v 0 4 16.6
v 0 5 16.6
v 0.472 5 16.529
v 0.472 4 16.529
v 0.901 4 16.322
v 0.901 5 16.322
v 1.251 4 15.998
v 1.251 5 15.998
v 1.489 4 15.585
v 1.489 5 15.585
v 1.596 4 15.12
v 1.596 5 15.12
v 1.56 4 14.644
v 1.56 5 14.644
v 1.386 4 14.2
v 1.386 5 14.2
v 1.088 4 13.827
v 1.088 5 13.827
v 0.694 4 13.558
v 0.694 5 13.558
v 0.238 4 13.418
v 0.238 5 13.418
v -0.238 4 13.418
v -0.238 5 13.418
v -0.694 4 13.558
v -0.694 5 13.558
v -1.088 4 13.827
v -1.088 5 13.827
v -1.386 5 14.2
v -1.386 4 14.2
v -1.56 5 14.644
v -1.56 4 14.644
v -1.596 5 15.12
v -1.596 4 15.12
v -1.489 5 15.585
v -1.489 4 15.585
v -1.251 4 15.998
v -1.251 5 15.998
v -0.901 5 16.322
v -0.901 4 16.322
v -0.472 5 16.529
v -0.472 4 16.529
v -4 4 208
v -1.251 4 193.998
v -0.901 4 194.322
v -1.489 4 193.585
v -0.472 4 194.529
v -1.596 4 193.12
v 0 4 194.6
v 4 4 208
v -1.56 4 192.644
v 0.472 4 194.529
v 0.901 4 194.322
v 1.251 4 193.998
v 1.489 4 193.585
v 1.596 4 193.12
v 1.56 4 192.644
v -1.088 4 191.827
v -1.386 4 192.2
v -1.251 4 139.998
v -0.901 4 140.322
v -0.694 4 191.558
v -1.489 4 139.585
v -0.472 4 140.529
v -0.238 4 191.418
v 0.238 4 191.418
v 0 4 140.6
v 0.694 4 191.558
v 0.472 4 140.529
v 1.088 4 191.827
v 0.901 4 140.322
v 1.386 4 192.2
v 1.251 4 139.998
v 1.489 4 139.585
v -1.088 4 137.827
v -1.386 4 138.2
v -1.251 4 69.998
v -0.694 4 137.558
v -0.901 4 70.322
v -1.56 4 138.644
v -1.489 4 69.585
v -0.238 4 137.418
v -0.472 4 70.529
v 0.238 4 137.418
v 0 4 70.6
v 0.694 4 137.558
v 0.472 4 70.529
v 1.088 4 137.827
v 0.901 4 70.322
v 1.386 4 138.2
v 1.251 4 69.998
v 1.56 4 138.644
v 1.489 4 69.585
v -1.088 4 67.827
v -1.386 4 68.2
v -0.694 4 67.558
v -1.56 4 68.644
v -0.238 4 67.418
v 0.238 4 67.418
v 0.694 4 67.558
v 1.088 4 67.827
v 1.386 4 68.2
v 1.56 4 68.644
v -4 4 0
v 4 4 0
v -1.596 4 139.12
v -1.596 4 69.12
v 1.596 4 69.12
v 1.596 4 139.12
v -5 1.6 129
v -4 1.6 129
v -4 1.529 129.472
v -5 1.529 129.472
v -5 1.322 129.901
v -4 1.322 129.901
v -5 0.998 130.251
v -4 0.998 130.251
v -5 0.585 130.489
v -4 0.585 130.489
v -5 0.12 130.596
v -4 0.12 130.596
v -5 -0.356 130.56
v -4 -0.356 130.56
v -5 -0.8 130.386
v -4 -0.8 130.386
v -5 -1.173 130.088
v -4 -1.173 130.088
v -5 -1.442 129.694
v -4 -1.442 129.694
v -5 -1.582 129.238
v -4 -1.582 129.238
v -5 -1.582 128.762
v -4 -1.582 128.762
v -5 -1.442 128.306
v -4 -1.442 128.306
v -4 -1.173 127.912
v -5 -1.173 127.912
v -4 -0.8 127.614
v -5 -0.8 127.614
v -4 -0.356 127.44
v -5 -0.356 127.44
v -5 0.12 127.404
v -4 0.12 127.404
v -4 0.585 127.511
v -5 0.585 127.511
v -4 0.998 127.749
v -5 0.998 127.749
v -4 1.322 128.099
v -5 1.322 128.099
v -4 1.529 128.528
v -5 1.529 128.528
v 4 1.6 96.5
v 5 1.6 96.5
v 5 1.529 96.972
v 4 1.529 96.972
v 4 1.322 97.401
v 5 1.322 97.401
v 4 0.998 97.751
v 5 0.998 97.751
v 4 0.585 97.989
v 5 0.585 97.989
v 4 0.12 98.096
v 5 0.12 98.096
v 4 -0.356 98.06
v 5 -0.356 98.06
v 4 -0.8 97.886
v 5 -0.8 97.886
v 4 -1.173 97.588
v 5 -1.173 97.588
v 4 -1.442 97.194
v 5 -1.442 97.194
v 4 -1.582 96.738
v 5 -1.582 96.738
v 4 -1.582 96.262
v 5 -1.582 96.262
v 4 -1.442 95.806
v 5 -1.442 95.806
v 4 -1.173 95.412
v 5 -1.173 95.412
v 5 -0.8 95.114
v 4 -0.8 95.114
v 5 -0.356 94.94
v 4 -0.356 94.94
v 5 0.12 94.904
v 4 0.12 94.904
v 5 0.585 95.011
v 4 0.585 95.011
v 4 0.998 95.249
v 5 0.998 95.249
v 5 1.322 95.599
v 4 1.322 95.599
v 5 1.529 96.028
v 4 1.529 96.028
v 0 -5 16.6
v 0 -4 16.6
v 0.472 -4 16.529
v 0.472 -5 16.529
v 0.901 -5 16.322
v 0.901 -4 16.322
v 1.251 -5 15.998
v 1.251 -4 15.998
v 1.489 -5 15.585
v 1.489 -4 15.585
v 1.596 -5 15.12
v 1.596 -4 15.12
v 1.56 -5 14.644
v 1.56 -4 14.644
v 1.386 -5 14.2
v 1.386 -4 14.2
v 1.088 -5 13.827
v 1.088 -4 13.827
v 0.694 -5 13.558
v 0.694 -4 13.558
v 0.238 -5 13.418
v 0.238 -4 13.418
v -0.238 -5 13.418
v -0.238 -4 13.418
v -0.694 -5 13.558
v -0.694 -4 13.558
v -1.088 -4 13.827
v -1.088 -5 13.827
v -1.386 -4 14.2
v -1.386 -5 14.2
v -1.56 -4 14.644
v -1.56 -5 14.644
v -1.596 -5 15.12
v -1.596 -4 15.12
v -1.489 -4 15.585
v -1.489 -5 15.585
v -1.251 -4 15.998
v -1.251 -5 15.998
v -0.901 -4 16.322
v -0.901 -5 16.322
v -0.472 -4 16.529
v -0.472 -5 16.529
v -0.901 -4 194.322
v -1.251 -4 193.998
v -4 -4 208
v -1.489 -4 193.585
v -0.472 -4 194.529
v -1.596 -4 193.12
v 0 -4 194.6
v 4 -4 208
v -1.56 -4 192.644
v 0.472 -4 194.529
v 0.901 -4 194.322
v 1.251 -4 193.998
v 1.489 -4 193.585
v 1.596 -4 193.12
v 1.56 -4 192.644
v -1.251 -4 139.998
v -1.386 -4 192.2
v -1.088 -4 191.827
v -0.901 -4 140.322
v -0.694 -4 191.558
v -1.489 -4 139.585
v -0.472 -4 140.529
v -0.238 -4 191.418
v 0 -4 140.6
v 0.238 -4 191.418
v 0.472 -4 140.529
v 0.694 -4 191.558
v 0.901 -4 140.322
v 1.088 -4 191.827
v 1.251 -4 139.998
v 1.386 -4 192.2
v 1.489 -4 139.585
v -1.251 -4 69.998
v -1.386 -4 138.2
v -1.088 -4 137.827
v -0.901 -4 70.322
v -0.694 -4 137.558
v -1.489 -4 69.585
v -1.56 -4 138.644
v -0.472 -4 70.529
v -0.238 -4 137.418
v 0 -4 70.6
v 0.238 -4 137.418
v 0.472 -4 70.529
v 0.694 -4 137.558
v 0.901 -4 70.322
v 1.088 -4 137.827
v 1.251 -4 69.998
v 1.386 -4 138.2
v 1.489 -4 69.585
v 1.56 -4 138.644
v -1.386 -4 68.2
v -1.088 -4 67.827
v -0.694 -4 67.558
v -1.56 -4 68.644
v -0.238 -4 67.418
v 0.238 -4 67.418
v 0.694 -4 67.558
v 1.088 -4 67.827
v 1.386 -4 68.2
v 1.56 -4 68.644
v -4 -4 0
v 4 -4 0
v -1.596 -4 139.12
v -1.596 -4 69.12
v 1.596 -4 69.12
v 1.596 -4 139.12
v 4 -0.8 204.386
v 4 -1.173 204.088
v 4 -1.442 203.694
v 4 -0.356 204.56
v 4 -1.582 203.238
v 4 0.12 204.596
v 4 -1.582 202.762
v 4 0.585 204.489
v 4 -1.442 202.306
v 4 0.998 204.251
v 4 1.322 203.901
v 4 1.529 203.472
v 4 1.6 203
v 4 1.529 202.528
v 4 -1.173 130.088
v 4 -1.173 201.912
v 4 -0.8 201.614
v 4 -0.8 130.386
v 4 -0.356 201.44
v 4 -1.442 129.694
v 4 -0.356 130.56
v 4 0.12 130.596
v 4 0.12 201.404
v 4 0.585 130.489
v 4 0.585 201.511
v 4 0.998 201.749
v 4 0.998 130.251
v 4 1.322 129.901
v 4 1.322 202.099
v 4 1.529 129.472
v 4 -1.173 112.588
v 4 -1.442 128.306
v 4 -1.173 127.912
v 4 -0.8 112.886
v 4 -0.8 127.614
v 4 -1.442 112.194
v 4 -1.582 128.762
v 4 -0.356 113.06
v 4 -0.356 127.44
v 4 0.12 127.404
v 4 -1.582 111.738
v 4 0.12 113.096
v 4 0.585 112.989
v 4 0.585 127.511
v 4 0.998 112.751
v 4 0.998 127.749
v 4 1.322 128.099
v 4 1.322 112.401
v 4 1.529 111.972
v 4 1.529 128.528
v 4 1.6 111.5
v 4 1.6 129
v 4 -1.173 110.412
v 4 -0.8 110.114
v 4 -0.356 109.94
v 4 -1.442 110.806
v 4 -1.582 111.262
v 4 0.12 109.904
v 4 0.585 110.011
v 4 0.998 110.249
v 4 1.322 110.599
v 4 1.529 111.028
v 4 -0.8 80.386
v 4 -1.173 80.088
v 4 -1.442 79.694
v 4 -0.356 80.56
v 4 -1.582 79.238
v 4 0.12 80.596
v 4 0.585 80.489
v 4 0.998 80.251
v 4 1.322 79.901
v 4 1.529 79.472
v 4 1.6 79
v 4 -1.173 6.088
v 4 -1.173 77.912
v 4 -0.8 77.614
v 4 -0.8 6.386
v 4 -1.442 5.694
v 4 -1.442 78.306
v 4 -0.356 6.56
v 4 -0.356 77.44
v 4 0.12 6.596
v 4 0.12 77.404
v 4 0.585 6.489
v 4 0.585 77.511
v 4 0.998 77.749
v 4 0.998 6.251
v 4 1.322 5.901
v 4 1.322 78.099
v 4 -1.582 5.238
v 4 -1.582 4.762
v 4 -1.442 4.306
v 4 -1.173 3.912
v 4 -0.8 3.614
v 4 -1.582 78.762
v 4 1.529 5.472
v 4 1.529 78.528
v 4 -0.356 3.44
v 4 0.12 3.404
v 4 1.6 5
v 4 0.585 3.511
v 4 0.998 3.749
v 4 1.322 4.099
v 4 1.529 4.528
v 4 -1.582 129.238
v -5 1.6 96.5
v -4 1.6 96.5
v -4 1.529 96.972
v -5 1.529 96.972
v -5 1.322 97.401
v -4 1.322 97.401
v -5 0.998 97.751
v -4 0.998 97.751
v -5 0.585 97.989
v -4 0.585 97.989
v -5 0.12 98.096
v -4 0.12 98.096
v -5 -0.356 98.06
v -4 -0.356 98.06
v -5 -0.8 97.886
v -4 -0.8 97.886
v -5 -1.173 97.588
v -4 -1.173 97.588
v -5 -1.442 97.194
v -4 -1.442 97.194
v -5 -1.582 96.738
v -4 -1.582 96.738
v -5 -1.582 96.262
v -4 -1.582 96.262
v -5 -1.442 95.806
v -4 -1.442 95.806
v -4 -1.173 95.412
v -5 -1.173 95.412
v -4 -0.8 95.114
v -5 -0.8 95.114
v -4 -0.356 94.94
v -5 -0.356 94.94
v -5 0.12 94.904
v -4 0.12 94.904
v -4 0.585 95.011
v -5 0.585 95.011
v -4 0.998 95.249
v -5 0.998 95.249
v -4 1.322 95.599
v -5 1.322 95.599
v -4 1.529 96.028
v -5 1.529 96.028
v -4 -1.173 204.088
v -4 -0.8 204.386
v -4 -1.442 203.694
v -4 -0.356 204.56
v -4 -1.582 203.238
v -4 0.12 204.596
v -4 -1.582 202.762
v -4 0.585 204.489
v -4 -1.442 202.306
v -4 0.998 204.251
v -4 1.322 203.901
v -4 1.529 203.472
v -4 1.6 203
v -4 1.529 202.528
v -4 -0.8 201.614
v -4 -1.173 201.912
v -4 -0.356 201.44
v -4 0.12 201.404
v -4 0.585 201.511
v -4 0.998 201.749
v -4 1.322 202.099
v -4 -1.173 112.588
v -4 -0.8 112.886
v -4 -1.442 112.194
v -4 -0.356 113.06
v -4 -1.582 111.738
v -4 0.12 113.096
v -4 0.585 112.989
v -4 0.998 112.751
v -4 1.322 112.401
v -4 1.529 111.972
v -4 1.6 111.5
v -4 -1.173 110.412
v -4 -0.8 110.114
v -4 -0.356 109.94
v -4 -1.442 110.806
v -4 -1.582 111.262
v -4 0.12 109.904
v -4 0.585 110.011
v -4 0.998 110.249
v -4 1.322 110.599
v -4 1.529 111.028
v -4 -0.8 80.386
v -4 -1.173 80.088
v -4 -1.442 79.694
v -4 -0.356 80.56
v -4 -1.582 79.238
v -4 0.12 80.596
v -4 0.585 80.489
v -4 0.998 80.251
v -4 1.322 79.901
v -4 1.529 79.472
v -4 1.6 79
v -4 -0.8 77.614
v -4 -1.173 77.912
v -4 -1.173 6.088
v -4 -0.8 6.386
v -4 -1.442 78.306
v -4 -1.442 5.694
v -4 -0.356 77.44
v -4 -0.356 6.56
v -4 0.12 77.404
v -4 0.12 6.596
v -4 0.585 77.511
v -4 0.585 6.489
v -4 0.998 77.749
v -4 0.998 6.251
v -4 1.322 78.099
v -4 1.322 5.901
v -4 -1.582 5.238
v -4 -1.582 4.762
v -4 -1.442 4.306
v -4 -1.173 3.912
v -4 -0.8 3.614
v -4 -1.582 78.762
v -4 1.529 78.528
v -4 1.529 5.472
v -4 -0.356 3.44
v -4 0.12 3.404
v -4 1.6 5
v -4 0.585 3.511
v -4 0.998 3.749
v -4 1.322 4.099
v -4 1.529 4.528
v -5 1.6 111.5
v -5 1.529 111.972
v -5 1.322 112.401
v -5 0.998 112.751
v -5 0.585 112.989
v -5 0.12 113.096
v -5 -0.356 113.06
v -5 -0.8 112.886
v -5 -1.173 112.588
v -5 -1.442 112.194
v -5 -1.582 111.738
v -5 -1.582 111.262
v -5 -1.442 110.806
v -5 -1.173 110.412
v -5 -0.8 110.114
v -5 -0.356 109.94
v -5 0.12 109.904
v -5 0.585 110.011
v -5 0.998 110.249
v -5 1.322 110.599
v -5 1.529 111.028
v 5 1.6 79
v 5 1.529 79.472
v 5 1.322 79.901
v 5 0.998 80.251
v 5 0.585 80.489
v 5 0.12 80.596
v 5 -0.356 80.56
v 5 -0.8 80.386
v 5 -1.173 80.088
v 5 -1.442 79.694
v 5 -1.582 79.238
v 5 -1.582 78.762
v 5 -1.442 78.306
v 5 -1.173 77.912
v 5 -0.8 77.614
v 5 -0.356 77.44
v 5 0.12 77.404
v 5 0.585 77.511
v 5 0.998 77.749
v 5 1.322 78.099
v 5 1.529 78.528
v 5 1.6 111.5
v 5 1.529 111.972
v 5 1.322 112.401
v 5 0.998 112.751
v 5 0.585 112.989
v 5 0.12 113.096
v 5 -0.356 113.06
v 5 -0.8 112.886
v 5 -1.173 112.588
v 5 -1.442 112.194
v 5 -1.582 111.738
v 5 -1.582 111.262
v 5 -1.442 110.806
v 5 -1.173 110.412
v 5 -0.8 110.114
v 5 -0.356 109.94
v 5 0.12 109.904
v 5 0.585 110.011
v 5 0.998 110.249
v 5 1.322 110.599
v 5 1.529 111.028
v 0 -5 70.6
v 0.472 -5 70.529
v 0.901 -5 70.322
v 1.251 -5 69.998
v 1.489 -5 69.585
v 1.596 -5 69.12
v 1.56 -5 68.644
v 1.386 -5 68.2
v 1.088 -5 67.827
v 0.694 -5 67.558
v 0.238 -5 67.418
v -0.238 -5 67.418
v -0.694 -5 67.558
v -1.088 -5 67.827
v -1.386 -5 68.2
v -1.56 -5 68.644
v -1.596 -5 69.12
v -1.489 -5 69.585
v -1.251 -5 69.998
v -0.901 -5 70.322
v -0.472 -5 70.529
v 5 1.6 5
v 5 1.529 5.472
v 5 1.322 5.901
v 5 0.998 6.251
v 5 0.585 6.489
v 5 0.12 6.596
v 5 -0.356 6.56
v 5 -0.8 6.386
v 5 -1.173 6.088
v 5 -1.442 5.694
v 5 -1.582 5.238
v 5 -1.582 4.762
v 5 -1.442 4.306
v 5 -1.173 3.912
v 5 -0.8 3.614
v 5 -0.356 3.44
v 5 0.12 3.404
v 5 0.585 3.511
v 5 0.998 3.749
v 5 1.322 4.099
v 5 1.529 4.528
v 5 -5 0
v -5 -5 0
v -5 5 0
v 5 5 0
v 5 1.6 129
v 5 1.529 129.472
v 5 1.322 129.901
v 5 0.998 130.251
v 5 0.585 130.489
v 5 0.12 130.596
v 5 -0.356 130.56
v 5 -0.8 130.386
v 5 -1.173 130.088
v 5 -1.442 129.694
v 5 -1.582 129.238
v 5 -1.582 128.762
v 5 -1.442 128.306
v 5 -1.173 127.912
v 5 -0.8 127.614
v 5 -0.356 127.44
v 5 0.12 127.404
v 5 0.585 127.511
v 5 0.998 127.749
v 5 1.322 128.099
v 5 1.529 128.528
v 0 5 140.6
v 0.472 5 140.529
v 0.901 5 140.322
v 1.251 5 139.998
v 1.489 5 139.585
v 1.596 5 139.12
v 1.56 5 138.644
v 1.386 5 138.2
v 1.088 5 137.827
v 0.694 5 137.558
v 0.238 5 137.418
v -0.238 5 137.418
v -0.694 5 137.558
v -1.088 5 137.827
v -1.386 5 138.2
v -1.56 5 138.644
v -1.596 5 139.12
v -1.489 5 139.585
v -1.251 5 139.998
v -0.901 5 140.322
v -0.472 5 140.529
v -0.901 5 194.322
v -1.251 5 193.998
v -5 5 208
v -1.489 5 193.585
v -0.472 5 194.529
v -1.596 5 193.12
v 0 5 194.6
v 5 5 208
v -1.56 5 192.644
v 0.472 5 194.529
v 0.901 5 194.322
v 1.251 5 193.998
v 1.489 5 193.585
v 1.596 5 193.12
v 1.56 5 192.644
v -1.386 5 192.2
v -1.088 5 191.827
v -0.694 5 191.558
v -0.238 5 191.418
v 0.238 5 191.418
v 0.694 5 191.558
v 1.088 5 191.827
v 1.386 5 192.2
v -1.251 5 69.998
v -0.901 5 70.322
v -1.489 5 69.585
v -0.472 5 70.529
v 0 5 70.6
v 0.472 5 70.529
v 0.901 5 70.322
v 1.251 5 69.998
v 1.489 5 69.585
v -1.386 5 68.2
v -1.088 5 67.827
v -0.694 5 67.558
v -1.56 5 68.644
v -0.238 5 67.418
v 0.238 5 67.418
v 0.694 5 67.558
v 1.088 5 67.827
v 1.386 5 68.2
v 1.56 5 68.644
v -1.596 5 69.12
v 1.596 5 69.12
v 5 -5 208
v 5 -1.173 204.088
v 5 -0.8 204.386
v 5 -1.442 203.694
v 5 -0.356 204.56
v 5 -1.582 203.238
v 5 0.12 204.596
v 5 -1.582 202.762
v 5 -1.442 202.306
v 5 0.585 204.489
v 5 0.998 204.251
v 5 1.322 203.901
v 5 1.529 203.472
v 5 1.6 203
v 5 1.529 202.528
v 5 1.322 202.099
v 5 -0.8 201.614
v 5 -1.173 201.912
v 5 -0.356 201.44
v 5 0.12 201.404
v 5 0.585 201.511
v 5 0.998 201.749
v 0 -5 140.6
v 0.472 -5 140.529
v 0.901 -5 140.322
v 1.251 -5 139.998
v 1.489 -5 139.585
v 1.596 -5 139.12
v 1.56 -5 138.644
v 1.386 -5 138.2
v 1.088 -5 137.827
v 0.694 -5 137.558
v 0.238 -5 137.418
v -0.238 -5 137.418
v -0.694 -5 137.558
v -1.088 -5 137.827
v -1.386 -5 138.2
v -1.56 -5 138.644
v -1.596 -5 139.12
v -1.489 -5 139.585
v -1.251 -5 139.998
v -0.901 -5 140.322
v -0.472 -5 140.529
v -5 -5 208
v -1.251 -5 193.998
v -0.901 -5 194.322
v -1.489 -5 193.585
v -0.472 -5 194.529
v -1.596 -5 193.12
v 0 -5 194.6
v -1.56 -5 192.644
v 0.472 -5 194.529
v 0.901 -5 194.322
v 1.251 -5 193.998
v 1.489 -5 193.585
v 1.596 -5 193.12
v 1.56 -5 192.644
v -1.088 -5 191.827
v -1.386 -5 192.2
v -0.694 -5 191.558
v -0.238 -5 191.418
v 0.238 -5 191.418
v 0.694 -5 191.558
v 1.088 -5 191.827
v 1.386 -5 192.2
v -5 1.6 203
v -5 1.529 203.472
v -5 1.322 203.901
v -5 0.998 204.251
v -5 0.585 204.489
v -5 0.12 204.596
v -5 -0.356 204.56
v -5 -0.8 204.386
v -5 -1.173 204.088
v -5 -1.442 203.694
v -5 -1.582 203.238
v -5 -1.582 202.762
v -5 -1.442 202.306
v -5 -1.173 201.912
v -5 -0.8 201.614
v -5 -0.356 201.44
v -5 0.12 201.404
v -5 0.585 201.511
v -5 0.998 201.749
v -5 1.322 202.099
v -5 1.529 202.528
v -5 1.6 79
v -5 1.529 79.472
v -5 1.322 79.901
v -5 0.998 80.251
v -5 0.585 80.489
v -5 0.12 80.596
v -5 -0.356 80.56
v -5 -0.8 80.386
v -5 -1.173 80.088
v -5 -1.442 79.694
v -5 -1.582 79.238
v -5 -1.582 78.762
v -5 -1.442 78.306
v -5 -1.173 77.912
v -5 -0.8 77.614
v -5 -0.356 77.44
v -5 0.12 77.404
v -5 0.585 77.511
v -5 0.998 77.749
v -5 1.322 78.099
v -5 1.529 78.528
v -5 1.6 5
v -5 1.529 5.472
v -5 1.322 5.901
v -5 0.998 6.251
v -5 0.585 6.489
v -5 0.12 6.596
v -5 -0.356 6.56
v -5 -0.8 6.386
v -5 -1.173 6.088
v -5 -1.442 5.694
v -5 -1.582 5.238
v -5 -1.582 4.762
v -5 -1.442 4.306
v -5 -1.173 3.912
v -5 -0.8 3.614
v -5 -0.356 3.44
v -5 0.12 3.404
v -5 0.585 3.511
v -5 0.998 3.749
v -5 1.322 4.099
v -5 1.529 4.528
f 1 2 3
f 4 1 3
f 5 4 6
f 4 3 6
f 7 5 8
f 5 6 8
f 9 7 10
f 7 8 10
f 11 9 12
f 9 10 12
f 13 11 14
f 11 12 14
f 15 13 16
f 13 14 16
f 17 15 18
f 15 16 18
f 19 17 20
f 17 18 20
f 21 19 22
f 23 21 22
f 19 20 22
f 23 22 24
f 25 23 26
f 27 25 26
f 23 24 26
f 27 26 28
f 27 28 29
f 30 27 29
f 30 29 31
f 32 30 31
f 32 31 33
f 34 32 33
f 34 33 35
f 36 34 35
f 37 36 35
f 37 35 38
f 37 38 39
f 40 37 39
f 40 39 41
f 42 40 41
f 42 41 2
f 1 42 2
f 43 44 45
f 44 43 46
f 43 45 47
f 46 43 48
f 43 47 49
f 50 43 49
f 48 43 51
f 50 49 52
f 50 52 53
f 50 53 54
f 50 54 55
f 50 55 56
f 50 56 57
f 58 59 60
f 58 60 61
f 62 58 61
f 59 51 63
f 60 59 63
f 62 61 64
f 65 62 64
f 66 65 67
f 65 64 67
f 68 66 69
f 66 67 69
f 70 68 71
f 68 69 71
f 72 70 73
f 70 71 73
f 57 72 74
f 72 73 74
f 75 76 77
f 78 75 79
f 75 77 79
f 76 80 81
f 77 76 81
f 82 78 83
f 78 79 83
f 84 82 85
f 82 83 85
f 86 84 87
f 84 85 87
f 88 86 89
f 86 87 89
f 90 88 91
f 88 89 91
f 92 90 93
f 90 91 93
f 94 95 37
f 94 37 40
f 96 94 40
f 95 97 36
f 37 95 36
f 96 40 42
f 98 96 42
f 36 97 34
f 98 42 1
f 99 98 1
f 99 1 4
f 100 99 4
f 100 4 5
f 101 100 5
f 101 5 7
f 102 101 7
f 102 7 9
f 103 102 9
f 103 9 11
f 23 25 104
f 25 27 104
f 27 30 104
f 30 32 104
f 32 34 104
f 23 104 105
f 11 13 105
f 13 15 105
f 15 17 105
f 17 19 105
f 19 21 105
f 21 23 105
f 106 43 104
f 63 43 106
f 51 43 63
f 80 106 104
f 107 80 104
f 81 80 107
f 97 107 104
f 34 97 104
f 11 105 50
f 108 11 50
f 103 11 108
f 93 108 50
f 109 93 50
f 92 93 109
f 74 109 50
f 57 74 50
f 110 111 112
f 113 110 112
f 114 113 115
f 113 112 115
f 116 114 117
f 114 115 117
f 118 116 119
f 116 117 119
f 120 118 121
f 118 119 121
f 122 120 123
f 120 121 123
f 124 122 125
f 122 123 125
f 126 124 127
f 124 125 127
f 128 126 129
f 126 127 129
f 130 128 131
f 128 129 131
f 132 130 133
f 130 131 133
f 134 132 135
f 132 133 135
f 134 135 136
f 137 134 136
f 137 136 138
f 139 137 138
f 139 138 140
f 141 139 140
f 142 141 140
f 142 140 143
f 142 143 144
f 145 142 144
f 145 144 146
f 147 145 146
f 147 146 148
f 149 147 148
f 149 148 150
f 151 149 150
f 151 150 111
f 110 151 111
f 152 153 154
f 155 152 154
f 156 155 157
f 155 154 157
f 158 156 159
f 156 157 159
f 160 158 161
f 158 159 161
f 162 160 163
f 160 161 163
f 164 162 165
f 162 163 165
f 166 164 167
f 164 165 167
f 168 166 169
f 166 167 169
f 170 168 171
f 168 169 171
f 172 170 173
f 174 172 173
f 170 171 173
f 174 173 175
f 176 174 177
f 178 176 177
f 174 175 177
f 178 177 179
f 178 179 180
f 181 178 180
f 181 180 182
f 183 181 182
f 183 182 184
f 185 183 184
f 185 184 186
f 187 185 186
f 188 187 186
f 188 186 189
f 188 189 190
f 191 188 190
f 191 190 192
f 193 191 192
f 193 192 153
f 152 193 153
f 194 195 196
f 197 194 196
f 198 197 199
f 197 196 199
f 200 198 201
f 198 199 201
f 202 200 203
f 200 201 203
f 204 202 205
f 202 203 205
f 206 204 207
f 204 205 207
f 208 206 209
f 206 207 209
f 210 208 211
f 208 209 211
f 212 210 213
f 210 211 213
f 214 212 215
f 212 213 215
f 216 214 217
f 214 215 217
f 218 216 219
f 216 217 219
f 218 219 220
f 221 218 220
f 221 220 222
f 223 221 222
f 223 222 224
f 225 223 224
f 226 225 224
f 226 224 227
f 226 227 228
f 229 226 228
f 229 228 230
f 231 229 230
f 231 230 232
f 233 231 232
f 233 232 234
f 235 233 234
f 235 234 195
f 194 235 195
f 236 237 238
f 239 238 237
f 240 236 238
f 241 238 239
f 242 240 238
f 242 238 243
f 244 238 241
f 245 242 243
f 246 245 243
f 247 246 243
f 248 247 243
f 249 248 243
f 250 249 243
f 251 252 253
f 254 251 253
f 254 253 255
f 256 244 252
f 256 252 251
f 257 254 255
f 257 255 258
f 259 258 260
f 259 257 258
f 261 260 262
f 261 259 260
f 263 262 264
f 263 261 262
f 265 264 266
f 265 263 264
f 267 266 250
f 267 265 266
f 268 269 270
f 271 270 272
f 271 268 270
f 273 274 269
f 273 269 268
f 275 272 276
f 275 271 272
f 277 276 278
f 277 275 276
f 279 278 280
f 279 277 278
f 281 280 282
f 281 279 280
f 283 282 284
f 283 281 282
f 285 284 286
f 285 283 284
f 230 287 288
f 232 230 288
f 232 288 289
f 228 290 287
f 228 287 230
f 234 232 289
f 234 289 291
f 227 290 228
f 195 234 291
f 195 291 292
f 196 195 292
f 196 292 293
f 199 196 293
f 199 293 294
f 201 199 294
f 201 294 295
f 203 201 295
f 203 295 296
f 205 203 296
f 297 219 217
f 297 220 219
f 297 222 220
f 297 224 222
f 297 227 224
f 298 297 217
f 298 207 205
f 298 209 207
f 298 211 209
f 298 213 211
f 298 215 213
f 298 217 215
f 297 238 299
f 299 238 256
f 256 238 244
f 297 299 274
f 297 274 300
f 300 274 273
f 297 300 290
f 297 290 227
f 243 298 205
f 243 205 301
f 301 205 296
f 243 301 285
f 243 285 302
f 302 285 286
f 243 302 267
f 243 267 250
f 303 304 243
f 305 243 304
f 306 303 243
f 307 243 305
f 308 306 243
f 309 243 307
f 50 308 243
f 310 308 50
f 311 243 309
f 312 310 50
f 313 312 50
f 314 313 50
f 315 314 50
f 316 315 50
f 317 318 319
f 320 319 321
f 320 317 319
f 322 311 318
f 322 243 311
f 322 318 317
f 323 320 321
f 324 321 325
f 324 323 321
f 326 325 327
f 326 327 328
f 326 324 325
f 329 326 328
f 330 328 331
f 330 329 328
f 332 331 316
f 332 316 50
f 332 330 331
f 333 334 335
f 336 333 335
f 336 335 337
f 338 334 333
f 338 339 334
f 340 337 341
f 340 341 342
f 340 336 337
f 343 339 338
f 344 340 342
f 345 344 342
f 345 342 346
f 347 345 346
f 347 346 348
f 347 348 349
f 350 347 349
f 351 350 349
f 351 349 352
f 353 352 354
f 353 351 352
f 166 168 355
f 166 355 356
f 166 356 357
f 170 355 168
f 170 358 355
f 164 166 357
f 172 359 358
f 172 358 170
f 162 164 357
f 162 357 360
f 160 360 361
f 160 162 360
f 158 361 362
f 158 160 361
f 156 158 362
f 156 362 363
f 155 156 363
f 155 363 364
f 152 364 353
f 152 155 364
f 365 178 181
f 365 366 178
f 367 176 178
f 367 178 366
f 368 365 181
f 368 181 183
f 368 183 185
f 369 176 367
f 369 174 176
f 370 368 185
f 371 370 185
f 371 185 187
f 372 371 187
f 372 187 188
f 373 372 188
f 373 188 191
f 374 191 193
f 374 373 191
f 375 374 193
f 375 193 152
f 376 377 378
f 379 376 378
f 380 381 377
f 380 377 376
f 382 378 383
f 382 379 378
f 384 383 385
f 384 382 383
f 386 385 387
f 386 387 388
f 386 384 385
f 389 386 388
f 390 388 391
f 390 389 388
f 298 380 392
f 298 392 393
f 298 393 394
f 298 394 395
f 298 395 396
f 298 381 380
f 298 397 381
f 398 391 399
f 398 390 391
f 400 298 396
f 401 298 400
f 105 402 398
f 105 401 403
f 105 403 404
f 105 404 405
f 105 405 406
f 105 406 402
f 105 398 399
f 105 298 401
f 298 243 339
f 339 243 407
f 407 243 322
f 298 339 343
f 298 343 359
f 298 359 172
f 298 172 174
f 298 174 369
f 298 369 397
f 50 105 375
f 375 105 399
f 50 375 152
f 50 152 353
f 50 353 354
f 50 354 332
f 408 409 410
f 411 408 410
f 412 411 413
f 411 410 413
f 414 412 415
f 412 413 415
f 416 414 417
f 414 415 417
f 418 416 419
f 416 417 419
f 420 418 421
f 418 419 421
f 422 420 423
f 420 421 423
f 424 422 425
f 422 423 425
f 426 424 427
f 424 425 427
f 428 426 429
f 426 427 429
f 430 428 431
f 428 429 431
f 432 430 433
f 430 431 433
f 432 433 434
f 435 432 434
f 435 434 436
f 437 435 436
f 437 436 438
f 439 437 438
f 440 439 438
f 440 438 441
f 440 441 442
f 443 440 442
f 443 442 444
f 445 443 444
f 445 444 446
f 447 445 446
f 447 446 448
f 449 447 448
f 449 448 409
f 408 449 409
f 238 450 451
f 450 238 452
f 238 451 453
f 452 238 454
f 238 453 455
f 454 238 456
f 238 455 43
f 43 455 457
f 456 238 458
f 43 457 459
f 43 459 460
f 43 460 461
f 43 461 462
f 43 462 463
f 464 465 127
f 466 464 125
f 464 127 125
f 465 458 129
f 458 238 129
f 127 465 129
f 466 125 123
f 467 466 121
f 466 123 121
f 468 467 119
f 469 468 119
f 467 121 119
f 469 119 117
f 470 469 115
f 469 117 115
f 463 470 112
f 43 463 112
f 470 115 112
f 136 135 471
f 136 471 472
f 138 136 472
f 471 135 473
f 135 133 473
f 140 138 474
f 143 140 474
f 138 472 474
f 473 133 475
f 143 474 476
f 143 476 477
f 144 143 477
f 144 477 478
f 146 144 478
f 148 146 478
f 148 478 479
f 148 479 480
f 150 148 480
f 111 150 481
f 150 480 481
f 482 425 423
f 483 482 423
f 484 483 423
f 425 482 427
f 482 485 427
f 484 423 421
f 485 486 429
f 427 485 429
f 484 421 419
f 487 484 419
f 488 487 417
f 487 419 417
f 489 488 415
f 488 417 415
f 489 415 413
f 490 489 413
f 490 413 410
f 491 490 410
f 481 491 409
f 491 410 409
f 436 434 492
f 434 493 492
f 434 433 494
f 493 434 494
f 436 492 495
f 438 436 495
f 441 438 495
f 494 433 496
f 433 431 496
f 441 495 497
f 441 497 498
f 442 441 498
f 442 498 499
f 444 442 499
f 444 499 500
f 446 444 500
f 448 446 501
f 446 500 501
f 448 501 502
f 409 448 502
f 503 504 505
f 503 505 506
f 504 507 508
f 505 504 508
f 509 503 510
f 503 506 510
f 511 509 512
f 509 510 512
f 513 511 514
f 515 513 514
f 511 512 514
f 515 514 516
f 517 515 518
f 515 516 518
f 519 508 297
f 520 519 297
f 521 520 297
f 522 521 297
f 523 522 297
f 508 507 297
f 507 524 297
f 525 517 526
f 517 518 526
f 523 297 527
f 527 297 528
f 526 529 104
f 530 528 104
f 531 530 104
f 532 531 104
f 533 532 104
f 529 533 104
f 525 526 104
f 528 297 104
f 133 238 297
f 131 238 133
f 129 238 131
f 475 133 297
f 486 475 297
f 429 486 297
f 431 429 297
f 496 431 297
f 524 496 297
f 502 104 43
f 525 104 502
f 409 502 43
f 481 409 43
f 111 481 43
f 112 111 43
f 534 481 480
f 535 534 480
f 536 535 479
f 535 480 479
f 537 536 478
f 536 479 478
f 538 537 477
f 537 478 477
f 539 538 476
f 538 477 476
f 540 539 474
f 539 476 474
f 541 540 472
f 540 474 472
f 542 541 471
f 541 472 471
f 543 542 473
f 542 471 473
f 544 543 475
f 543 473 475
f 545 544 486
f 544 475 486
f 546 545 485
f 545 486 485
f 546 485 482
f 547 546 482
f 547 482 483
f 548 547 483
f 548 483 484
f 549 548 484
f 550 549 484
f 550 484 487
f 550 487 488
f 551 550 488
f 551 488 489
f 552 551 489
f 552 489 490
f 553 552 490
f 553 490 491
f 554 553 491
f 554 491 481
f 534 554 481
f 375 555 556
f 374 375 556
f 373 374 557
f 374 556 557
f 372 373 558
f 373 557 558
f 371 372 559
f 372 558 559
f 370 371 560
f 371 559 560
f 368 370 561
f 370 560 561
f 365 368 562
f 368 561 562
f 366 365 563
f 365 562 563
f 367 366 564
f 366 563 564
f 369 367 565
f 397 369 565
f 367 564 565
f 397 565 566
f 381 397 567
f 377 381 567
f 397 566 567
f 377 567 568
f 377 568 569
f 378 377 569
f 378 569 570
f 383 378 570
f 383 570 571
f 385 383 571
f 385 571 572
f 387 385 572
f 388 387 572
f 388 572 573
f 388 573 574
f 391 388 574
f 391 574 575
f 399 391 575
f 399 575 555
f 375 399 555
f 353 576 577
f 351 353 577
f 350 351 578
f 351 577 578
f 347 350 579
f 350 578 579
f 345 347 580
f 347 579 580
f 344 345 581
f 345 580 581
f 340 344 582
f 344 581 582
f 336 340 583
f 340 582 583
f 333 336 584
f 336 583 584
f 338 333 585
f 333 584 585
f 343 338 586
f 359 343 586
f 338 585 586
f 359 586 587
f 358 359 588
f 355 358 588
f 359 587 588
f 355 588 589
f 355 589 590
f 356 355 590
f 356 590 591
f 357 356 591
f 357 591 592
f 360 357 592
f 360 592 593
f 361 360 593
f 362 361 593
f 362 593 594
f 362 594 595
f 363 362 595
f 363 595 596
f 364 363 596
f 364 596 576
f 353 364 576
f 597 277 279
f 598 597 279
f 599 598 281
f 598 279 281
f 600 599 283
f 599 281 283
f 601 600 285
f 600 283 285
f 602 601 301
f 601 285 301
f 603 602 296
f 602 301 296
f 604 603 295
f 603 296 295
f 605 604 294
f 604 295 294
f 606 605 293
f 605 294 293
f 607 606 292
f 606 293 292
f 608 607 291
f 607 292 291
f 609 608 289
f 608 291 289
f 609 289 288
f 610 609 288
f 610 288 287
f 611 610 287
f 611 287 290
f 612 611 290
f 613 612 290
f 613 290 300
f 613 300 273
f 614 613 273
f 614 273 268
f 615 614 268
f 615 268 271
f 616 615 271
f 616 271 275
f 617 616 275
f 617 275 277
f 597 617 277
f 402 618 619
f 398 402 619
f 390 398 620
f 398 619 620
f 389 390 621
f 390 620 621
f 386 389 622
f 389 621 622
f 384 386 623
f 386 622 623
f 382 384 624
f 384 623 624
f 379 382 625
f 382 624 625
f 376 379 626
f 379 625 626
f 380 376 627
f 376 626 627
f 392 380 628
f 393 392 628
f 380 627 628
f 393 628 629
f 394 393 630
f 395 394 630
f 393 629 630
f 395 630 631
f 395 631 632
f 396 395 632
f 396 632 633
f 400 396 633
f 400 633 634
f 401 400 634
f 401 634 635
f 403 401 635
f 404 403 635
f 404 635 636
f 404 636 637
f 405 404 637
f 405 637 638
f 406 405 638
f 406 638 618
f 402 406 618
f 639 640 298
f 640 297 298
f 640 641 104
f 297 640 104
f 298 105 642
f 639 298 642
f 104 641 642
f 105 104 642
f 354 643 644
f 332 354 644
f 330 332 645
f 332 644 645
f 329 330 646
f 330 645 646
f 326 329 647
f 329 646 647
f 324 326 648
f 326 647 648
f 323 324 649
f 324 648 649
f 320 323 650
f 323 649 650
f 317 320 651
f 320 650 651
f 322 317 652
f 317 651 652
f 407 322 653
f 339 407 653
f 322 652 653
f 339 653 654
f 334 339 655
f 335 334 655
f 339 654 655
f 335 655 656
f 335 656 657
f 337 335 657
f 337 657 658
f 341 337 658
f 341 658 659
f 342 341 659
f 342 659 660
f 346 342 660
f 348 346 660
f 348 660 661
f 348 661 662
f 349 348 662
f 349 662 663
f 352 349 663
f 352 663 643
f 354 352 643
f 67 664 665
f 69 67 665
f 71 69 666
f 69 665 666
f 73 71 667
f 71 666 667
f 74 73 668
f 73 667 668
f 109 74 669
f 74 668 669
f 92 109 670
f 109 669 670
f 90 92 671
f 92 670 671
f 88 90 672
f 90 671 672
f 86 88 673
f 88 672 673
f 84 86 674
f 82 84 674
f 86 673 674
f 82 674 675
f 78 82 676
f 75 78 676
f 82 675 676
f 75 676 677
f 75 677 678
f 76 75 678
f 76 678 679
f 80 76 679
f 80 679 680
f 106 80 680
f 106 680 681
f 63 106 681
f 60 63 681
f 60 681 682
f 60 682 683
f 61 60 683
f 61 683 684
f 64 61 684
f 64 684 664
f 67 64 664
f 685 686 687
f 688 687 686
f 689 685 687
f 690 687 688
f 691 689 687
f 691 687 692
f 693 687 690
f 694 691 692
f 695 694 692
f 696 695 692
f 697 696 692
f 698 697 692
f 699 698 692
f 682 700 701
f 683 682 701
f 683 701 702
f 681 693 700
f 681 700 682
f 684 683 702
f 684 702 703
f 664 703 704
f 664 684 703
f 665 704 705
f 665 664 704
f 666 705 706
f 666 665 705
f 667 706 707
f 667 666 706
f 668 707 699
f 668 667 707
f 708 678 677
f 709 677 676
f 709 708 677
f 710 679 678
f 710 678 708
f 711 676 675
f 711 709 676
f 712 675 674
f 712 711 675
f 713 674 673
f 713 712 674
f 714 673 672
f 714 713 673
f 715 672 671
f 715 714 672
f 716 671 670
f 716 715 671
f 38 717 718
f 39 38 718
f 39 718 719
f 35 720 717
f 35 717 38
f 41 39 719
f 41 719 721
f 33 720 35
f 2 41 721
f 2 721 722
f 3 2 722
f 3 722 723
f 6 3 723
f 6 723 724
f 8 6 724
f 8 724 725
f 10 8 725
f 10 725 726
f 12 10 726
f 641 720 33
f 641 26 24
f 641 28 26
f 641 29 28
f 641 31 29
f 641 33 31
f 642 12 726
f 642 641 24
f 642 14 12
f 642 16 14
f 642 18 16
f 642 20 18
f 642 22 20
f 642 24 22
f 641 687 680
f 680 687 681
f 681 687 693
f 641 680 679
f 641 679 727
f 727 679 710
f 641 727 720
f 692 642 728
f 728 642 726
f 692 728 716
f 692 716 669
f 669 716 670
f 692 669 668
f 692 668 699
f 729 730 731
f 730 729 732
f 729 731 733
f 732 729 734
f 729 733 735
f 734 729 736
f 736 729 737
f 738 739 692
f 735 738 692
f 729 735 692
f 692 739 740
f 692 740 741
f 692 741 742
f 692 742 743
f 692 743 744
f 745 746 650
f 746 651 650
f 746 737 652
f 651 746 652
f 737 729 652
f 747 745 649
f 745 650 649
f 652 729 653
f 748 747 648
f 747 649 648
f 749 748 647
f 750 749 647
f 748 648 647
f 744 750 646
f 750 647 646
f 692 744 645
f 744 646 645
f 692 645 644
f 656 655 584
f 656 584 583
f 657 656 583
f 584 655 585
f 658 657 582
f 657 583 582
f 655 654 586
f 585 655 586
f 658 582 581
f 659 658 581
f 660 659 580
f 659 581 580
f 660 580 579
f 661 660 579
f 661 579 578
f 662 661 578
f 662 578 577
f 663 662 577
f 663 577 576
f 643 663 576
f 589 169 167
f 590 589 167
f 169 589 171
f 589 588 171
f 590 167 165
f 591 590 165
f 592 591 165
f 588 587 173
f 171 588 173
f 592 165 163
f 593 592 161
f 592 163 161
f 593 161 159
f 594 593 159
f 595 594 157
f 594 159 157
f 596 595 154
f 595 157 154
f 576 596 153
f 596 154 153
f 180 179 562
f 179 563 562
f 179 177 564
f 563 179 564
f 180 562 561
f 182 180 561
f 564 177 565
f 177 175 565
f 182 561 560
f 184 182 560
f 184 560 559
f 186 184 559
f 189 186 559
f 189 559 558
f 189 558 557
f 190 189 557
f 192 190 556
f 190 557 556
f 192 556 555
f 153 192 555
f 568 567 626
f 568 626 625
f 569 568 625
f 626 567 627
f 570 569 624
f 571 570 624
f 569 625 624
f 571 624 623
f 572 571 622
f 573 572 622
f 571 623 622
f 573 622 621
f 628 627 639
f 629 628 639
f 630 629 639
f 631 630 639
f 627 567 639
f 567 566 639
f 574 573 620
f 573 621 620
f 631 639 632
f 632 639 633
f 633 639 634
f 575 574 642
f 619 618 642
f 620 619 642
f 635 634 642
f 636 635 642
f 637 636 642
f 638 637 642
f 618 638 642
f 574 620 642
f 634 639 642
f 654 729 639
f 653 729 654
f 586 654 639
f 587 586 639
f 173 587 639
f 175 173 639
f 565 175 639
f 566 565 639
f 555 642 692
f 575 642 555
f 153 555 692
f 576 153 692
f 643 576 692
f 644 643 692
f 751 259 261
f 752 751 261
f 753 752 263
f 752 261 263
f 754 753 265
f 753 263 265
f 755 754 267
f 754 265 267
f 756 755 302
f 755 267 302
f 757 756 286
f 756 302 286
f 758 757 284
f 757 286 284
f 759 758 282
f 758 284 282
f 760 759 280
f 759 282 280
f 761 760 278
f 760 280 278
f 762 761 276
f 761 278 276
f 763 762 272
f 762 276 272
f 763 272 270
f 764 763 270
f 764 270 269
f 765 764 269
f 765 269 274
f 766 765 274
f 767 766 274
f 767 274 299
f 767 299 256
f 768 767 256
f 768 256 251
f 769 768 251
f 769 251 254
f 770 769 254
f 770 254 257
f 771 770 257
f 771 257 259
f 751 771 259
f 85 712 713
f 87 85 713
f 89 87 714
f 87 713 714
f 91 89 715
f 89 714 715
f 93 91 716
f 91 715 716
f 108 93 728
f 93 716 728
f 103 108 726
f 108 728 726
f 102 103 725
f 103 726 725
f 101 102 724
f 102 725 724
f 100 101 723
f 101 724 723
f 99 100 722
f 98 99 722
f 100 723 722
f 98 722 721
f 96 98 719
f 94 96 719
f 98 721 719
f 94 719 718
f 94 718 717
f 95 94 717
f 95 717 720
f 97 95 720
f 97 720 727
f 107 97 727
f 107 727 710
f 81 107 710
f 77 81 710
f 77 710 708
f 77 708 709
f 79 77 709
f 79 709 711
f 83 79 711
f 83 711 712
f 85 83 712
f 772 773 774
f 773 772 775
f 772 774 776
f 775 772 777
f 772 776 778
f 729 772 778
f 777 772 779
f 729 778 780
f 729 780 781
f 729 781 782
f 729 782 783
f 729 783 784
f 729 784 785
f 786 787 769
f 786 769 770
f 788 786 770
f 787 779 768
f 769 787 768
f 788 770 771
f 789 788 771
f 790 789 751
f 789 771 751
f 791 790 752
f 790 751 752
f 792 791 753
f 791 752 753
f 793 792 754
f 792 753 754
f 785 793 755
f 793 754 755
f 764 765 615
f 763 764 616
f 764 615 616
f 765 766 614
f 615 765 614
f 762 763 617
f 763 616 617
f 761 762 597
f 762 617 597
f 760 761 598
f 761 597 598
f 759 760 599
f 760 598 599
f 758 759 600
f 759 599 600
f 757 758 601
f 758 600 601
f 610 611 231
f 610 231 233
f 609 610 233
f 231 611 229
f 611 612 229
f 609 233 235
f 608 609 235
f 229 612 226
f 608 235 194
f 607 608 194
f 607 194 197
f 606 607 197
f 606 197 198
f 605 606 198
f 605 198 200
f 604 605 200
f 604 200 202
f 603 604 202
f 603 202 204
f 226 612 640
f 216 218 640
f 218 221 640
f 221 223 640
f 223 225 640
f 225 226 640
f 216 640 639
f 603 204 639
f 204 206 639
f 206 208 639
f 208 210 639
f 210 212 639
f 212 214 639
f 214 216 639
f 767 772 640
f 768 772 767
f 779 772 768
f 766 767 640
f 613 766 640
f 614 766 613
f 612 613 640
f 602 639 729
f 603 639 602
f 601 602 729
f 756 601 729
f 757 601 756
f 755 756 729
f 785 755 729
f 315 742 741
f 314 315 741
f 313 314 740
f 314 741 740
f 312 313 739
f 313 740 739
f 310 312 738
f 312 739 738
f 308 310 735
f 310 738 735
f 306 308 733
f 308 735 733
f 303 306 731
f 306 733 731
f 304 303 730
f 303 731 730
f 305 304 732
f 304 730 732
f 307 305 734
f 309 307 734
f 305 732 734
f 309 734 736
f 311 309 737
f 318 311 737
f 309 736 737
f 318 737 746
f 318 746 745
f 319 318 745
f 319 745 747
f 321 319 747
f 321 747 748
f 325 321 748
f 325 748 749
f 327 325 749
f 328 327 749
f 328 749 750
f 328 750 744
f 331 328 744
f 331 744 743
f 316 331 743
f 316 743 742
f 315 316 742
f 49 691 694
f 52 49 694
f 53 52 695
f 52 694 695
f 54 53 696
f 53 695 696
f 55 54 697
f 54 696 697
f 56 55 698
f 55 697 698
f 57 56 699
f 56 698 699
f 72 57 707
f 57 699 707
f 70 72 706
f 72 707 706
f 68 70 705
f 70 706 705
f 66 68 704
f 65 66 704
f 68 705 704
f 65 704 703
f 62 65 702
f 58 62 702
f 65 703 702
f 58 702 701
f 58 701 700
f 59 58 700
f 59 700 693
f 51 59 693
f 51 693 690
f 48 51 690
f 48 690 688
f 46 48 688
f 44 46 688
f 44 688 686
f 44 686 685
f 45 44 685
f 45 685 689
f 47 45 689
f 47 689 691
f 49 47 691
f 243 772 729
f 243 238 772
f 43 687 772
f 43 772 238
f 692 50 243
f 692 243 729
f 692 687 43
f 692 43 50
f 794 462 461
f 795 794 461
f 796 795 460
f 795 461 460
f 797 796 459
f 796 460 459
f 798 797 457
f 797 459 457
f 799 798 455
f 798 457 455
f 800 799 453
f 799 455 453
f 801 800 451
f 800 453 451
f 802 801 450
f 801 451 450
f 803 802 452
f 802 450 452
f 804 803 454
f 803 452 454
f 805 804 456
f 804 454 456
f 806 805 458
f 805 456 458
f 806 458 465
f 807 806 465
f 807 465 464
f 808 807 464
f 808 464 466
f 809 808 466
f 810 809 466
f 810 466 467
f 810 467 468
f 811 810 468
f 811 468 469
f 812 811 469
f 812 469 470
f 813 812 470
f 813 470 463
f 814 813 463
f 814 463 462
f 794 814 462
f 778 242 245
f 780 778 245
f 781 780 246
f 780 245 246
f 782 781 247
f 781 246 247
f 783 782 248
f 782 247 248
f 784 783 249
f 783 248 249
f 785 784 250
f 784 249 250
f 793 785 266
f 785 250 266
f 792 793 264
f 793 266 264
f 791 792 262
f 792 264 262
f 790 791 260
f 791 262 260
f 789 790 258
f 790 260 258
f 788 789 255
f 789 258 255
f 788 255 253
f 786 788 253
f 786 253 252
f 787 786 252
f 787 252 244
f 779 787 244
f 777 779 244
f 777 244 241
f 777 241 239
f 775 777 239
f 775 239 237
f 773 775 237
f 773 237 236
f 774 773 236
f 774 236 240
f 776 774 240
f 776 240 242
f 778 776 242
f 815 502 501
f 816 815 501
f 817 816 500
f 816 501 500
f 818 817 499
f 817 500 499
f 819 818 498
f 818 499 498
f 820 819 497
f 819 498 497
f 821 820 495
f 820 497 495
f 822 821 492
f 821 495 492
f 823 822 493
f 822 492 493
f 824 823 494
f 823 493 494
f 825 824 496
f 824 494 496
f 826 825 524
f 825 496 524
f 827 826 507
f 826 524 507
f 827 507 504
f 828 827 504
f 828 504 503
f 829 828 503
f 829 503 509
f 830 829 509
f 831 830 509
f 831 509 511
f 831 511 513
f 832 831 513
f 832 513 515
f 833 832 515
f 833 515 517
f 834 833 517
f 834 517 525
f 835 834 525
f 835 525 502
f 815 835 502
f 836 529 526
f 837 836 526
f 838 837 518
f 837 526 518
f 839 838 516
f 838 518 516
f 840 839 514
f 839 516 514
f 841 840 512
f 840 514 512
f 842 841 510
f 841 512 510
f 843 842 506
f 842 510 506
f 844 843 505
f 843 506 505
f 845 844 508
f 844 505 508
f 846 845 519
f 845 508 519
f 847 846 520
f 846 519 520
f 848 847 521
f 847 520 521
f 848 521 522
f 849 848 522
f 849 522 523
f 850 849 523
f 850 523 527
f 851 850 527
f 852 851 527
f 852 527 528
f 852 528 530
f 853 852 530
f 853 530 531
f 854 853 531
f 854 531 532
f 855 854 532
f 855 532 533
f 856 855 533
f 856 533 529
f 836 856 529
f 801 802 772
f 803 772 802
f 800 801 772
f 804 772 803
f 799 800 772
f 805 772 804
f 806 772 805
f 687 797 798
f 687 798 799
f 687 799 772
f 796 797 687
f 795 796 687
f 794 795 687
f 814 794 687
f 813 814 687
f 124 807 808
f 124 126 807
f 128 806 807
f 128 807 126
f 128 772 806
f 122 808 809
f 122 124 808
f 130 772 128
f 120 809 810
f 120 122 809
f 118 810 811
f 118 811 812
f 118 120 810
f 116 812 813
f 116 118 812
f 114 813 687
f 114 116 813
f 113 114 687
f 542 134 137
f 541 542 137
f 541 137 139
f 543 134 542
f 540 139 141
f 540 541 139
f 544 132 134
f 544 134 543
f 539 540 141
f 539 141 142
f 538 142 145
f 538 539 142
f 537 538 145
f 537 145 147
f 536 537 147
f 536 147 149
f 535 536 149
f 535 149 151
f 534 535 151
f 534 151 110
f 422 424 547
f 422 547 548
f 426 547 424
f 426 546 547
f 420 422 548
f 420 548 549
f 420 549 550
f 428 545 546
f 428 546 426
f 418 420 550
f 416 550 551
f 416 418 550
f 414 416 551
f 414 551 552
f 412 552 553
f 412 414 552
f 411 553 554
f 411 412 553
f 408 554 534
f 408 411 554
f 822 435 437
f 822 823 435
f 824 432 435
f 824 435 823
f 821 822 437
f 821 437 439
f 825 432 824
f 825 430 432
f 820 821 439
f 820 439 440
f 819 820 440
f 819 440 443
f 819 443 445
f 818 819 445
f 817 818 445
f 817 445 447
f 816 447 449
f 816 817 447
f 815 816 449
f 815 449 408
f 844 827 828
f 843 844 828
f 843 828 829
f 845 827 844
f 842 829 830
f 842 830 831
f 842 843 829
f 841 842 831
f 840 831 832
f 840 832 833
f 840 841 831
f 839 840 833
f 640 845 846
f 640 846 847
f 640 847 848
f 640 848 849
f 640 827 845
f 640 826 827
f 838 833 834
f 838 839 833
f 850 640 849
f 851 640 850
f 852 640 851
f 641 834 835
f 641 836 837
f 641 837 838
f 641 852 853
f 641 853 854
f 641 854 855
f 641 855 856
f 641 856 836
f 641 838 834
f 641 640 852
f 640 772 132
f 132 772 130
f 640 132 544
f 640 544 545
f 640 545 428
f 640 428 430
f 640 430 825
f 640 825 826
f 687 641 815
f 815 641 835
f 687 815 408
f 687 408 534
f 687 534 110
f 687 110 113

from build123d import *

# Parameters (mm, degrees)
SKETCH_1_W          = 10
SKETCH_1_H          = 10
SKETCH_1_W_2        = 8
SKETCH_1_H_2        = 8
EXTRUDE_1_DEPTH     = 208
SKETCH_2_R          = 1.6
CUT_EXTRUDE_1_DEPTH = 209.300264042
SKETCH_3_R          = 1.6
CUT_EXTRUDE_2_DEPTH = 209.300264042
SKETCH_4_R          = 1.6
CUT_EXTRUDE_3_DEPTH = 209.300264042
SKETCH_5_R          = 1.6
CUT_EXTRUDE_4_DEPTH = 209.300264042


with BuildPart() as part:
    # ｽｹｯﾁ1 → ﾎﾞｽ - 押し出し1 (new body)
    with BuildSketch(Plane.XY):
        Rectangle(SKETCH_1_W, SKETCH_1_H)
        Rectangle(SKETCH_1_W_2, SKETCH_1_H_2, mode=Mode.SUBTRACT)
    extrude(amount=EXTRUDE_1_DEPTH)

    # ｽｹｯﾁ2 → ｶｯﾄ - 押し出し1 (cut, through all)
    with BuildSketch(Plane(origin=(5, 0, 0), x_dir=(0, 0, -1), z_dir=(1, 0, 0))):
        with Locations(Location((-203, 0, 0), (0, 0, 90))):
            Circle(SKETCH_2_R)
        with Locations(Location((-111.5, 0, 0), (0, 0, 90))):
            Circle(SKETCH_2_R)
        with Locations(Location((-96.5, 0, 0), (0, 0, 90))):
            Circle(SKETCH_2_R)
        with Locations(Location((-5, 0, 0), (0, 0, 90))):
            Circle(SKETCH_2_R)
    extrude(amount=-CUT_EXTRUDE_1_DEPTH, mode=Mode.SUBTRACT)

    # ｽｹｯﾁ3 → ｶｯﾄ - 押し出し2 (cut, through all)
    with BuildSketch(Plane(origin=(0, 5, 0), x_dir=(1, 0, 0), z_dir=(0, 1, 0))):
        with Locations(Location((0, -193, 0), (0, 0, 270))):
            Circle(SKETCH_3_R)
        with Locations(Location((0, -15, 0), (0, 0, 270))):
            Circle(SKETCH_3_R)
    extrude(amount=-CUT_EXTRUDE_2_DEPTH, mode=Mode.SUBTRACT)

    # ｽｹｯﾁ4 → ｶｯﾄ - 押し出し3 (cut, through all)
    with BuildSketch(Plane(origin=(5, 0, 0), x_dir=(0, 0, -1), z_dir=(1, 0, 0))):
        with Locations(Location((-129, 0, 0), (0, 0, 90))):
            Circle(SKETCH_4_R)
        with Locations(Location((-79, 0, 0), (0, 0, 90))):
            Circle(SKETCH_4_R)
    extrude(amount=-CUT_EXTRUDE_3_DEPTH, mode=Mode.SUBTRACT)

    # ｽｹｯﾁ5 → ｶｯﾄ - 押し出し4 (cut, through all)
    with BuildSketch(Plane(origin=(0, 5, 0), x_dir=(1, 0, 0), z_dir=(0, 1, 0))):
        with Locations(Location((0, -139, 0), (0, 0, 270))):
            Circle(SKETCH_5_R)
        with Locations(Location((0, -69, 0), (0, 0, 270))):
            Circle(SKETCH_5_R)
    extrude(amount=-CUT_EXTRUDE_4_DEPTH, mode=Mode.SUBTRACT)


solid = part.part
